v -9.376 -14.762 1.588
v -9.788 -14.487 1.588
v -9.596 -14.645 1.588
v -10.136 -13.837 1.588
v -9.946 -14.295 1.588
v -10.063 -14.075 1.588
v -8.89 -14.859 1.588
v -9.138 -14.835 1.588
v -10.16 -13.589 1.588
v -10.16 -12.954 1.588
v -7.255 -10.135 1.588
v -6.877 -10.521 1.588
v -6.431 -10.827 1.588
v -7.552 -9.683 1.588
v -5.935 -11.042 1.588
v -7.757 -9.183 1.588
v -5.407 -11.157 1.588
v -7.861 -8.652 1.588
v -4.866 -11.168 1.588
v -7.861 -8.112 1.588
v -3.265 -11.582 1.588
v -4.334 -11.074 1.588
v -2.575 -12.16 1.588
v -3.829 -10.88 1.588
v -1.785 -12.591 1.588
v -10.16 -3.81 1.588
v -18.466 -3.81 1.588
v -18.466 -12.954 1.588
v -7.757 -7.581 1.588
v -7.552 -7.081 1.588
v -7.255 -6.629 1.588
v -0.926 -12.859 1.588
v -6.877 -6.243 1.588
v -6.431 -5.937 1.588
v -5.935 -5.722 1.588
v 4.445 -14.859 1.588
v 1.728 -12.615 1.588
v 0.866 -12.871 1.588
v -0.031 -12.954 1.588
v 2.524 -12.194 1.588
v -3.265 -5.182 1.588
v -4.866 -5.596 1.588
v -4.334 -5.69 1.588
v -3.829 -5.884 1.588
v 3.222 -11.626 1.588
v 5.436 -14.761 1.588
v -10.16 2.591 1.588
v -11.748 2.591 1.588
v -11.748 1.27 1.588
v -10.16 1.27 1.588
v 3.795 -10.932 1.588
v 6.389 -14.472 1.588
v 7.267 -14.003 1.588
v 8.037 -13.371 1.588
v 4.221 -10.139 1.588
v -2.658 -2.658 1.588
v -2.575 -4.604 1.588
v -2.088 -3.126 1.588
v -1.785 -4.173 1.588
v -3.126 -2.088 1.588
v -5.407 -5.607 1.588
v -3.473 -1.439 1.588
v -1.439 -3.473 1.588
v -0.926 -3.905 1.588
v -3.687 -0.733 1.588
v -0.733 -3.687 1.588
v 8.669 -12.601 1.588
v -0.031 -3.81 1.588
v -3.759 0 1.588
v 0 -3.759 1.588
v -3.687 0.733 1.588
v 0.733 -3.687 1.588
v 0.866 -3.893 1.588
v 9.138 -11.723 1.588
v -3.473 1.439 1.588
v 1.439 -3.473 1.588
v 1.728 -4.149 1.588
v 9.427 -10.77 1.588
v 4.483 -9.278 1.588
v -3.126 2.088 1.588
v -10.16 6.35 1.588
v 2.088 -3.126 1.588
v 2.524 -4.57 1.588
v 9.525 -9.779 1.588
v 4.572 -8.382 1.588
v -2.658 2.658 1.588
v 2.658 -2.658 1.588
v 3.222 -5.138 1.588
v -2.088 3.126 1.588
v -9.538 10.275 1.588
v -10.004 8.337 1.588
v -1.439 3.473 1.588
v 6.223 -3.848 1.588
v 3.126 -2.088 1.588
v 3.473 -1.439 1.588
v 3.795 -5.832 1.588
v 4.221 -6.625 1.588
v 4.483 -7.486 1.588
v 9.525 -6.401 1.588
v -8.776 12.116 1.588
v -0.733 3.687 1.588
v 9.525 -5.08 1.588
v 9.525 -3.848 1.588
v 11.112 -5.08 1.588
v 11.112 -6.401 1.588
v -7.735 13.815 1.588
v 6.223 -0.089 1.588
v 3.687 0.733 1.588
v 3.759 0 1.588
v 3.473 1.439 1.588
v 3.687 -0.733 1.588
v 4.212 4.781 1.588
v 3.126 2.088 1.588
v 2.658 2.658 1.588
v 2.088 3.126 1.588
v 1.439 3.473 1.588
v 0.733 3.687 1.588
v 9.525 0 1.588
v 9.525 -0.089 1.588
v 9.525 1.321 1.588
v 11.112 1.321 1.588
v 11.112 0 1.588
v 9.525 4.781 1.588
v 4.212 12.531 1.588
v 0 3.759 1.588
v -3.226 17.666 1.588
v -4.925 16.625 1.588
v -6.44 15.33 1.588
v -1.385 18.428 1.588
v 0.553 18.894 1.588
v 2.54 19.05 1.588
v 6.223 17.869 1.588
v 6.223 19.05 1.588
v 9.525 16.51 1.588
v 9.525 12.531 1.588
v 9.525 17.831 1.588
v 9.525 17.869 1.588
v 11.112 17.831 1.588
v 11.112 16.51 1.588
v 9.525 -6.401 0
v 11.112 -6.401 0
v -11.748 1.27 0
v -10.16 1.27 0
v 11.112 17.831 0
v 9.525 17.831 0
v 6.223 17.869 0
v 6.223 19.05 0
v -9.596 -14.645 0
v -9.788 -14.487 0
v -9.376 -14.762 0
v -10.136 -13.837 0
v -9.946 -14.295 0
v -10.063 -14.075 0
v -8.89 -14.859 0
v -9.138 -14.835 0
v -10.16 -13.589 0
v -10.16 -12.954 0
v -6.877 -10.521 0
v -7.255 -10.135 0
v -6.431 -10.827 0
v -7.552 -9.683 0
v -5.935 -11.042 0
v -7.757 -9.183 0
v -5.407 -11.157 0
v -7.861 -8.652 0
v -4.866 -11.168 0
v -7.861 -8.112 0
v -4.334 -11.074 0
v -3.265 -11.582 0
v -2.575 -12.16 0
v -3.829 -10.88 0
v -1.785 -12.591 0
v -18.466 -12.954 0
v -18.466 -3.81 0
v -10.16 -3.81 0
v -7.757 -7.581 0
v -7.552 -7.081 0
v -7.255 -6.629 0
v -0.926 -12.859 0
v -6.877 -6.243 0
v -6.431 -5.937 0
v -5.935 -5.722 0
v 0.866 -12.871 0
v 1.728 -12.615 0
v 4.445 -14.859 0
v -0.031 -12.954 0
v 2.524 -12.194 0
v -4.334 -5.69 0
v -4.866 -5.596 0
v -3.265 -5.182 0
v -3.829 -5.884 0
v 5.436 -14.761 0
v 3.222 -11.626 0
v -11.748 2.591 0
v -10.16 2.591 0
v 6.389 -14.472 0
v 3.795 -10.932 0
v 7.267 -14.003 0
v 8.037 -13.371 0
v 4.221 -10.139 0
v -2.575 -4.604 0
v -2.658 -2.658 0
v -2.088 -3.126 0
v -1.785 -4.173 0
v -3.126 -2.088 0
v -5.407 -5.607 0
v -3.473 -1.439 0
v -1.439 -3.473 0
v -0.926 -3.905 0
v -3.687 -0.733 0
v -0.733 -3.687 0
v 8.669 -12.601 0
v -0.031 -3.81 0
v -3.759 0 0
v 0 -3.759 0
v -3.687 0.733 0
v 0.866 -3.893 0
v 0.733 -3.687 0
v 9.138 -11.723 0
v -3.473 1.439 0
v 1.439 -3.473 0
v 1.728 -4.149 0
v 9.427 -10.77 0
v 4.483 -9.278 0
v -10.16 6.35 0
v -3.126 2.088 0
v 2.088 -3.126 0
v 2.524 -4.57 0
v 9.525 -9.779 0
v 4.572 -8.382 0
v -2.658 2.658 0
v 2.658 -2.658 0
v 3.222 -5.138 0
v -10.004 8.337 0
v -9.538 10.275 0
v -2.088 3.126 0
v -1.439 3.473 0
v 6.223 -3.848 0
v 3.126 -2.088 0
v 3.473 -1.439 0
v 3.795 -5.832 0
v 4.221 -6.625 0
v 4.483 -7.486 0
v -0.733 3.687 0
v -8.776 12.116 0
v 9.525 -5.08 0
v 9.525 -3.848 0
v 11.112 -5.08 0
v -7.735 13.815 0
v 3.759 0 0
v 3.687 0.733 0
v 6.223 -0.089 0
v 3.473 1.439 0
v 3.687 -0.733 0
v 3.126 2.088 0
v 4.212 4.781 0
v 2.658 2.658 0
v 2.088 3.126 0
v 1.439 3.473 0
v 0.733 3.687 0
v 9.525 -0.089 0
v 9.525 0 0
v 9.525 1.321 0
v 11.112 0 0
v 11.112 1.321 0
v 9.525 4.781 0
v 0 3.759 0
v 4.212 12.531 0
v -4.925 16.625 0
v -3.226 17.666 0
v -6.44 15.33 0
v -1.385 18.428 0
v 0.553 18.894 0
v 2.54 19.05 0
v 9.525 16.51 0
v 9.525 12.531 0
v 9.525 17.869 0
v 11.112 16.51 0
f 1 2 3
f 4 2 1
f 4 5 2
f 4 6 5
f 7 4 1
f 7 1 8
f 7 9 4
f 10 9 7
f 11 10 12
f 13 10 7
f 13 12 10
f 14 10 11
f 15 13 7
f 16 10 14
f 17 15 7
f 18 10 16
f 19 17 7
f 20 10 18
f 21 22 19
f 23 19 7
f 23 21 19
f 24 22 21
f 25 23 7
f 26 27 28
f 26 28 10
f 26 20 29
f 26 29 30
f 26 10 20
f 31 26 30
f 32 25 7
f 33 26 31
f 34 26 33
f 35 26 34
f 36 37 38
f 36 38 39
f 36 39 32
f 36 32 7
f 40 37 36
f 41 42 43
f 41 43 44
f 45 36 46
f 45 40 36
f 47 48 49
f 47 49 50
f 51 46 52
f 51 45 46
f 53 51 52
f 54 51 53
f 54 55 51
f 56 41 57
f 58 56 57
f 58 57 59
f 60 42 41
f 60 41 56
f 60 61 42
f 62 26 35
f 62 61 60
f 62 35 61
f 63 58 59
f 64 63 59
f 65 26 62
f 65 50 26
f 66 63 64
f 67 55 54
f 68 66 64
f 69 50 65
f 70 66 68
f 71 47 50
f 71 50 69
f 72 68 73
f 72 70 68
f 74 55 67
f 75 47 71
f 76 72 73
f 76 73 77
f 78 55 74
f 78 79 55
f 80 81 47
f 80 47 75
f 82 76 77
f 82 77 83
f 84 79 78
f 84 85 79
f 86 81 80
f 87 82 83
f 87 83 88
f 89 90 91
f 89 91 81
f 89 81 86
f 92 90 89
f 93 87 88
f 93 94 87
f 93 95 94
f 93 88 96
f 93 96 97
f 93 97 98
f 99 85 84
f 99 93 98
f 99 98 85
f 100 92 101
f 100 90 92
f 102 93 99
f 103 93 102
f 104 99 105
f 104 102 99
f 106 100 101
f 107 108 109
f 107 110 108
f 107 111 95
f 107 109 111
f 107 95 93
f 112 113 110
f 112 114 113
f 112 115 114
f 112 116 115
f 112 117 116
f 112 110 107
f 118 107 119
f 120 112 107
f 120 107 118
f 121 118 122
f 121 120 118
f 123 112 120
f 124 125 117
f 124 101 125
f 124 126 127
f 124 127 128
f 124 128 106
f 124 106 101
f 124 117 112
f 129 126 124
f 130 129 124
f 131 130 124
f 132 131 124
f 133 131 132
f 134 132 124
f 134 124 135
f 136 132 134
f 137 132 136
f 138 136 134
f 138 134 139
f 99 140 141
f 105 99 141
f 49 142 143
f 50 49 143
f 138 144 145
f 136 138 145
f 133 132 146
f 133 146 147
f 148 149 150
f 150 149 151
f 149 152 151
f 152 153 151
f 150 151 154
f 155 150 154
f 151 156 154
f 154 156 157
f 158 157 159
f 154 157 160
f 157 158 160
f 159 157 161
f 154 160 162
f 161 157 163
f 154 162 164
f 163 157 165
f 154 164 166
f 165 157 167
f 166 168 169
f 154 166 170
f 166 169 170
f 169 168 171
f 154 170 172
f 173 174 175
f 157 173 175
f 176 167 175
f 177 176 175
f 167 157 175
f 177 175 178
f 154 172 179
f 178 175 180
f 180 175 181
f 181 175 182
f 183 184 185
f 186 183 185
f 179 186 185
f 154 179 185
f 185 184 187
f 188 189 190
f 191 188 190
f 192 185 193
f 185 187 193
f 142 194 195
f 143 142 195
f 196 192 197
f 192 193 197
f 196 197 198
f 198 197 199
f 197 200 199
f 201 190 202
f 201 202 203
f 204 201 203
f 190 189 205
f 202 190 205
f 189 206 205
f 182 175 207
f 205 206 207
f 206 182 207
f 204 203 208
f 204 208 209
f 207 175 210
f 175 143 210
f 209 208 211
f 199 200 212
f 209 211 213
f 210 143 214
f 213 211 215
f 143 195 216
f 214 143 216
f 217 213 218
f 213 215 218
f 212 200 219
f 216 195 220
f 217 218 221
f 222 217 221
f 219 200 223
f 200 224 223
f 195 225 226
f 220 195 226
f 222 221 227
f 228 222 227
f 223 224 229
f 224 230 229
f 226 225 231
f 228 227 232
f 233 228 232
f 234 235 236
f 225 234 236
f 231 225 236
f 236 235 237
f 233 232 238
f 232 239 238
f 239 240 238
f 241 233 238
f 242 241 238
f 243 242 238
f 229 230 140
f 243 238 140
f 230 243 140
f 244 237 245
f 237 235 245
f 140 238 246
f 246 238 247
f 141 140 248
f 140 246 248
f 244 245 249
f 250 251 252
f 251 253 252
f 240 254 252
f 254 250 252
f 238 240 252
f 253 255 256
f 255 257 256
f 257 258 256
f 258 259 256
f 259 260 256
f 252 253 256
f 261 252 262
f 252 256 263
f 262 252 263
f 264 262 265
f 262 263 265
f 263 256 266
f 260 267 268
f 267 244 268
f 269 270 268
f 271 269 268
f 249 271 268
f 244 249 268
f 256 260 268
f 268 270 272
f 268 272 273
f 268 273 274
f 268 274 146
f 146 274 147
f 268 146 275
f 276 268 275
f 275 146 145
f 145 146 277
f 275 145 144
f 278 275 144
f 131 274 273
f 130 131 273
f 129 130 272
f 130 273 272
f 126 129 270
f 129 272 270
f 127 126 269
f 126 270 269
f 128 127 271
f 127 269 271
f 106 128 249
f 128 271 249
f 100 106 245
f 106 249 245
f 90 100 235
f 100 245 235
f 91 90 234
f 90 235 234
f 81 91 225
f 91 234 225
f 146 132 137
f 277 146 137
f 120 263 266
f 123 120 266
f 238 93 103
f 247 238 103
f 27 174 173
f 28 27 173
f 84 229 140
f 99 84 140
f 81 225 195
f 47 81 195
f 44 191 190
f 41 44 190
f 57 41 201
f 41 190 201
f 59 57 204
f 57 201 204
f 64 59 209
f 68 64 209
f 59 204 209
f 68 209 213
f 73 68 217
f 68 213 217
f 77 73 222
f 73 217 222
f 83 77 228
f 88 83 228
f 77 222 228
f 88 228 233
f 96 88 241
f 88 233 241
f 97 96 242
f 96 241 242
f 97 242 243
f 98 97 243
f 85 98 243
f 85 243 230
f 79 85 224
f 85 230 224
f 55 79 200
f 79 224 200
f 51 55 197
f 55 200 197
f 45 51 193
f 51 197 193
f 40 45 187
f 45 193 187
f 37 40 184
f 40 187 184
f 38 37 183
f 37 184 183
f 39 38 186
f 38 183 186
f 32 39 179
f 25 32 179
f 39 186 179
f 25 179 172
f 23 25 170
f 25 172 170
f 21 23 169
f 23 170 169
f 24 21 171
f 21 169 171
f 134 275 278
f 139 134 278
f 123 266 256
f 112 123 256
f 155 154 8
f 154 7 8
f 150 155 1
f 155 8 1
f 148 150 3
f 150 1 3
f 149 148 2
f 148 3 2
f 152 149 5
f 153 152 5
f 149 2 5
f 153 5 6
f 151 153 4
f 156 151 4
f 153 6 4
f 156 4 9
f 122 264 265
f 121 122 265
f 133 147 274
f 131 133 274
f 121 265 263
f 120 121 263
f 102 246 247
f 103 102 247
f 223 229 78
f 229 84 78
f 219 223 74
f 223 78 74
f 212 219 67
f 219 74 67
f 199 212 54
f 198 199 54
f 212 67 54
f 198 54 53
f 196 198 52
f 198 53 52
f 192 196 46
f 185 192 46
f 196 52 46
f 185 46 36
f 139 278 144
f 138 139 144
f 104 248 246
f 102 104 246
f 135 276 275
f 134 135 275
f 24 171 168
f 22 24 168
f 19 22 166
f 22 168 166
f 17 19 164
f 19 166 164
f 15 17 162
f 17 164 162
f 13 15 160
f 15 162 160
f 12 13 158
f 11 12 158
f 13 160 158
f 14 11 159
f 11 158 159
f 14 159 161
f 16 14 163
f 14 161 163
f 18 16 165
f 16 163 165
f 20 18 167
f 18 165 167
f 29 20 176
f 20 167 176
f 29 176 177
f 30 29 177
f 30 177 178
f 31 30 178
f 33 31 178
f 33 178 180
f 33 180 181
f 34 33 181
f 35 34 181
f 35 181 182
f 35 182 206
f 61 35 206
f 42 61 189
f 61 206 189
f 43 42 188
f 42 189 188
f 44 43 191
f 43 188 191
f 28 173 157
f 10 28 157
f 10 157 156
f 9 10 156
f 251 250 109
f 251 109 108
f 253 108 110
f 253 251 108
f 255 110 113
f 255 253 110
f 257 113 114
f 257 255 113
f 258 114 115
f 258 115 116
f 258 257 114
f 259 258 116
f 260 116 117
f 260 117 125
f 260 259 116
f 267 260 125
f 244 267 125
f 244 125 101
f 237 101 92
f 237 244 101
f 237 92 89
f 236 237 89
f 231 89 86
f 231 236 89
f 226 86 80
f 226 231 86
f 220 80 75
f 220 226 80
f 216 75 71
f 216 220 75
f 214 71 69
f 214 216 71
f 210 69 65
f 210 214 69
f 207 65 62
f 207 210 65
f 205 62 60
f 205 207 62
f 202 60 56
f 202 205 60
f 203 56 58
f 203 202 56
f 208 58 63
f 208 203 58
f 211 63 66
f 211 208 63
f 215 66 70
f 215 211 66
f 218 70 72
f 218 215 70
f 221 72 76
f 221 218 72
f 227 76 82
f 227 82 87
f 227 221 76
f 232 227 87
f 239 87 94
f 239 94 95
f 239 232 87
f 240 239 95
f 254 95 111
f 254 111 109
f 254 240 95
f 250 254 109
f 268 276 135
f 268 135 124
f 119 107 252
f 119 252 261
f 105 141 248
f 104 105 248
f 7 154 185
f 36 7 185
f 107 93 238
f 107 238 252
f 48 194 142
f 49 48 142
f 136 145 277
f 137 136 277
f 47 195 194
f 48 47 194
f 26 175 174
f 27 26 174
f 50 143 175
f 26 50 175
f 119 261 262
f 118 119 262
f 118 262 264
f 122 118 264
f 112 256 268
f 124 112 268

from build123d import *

# Parameters (mm, degrees)
SKETCH1_R           = 3.7592
BOSS_EXTRUDE1_DEPTH = 1.5875
CUT_EXTRUDE1_REACH  = 28.578
SKETCH2_W           = 3.302
SKETCH2_H           = 3.7592
CUT_EXTRUDE2_REACH  = 28.578
SKETCH3_W           = 8.3
SKETCH3_H           = 7.75
FILLET1_R           = 5.08
FILLET2_R           = 1.27


with BuildPart() as part:
    # Sketch1 → Boss-Extrude1 (new body)
    with BuildSketch(Plane.XY):
        with BuildLine():
            Line((11.1125, 17.8308), (9.525, 17.8308))
            Line((9.525, 17.8308), (9.525, 19.05))
            Line((9.525, 19.05), (2.54, 19.05))
            ThreePointArc((2.54, 19.05), (-6.440256121, 15.330256121), (-10.16, 6.35))
            Line((-10.16, 6.35), (-10.16, 2.5908))
            Line((-10.16, 2.5908), (-11.7475, 2.5908))
            Line((-11.7475, 2.5908), (-11.7475, 1.27))
            Line((-11.7475, 1.27), (-10.16, 1.27))
            Line((-10.16, 1.27), (-10.16, -3.81))
            Line((-10.16, -3.81), (-18.4658, -3.81))
            Line((-18.4658, -3.81), (-18.4658, -12.954))
            Line((-18.4658, -12.954), (-10.16, -12.954))
            Line((-10.16, -12.954), (-10.16, -14.859))
            Line((-10.16, -14.859), (9.525, -14.859))
            Line((9.525, -14.859), (9.525, -6.4008))
            Line((9.525, -6.4008), (11.1125, -6.4008))
            Line((11.1125, -6.4008), (11.1125, -5.08))
            Line((11.1125, -5.08), (9.525, -5.08))
            Line((9.525, -5.08), (9.525, 0))
            Line((9.525, 0), (11.1125, 0))
            Line((11.1125, 0), (11.1125, 1.3208))
            Line((11.1125, 1.3208), (9.525, 1.3208))
            Line((9.525, 1.3208), (9.525, 16.51))
            Line((9.525, 16.51), (11.1125, 16.51))
            Line((11.1125, 16.51), (11.1125, 17.8308))
        make_face()
        Circle(SKETCH1_R, mode=Mode.SUBTRACT)
        with BuildLine():
            ThreePointArc((-3.82905, -5.883688551), (4.572, -8.382), (-3.82905, -10.880311449))
            ThreePointArc((-3.82905, -10.880311449), (-7.874, -8.382), (-3.82905, -5.883688551))
        make_face(mode=Mode.SUBTRACT)
    extrude(amount=BOSS_EXTRUDE1_DEPTH)

    # Sketch2 → Cut-Extrude1 (cut, up to next)
    with BuildSketch(Plane.XY.offset(1.5875), mode=Mode.PRIVATE) as cut_extrude1_sk1:
        with Locations((7.874, -1.9685)):
            Rectangle(SKETCH2_W, SKETCH2_H)
    cut_extrude1_tool1 = extrude(cut_extrude1_sk1.sketch, amount=-CUT_EXTRUDE1_REACH, mode=Mode.PRIVATE) & part.part
    # Sketch2 → Cut-Extrude1 (cut, up to next)
    with BuildSketch(Plane.XY.offset(1.5875), mode=Mode.PRIVATE) as cut_extrude1_sk2:
        with Locations((7.874, 19.7485)):
            Rectangle(SKETCH2_W, SKETCH2_H)
    cut_extrude1_tool2 = extrude(cut_extrude1_sk2.sketch, amount=-CUT_EXTRUDE1_REACH, mode=Mode.PRIVATE) & part.part
    add(cut_extrude1_tool1.solids().sort_by_distance((7.874, -1.9685, 1.5875))[0], mode=Mode.SUBTRACT)
    add(cut_extrude1_tool2.solids().sort_by_distance((7.874, 19.7485, 1.5875))[0], mode=Mode.SUBTRACT)

    # Sketch3 → Cut-Extrude2 (cut, up to next)
    with BuildSketch(Plane(origin=(0, 0, 0), x_dir=(-1, 0, 0), z_dir=(0, 0, -1)), mode=Mode.PRIVATE) as cut_extrude2_sk1:
        with Locations((-8.3625, 8.656327373)):
            Rectangle(SKETCH3_W, SKETCH3_H)
    cut_extrude2_tool1 = extrude(cut_extrude2_sk1.sketch, amount=-CUT_EXTRUDE2_REACH, mode=Mode.PRIVATE) & part.part
    add(cut_extrude2_tool1.solids().sort_by_distance((8.3625, 8.656327, 0))[0], mode=Mode.SUBTRACT)

    # Fillet1
    fillet1_edges = [part.edges().sort_by_distance(p)[0] for p in [
        (9.525, -14.859, 0.79375),
    ]]
    fillet(fillet1_edges, radius=FILLET1_R)

    # Fillet2
    fillet2_edges = [part.edges().sort_by_distance(p)[0] for p in [
        (-10.16, -14.859, 0.79375),
    ]]
    fillet(fillet2_edges, radius=FILLET2_R)


solid = part.part
